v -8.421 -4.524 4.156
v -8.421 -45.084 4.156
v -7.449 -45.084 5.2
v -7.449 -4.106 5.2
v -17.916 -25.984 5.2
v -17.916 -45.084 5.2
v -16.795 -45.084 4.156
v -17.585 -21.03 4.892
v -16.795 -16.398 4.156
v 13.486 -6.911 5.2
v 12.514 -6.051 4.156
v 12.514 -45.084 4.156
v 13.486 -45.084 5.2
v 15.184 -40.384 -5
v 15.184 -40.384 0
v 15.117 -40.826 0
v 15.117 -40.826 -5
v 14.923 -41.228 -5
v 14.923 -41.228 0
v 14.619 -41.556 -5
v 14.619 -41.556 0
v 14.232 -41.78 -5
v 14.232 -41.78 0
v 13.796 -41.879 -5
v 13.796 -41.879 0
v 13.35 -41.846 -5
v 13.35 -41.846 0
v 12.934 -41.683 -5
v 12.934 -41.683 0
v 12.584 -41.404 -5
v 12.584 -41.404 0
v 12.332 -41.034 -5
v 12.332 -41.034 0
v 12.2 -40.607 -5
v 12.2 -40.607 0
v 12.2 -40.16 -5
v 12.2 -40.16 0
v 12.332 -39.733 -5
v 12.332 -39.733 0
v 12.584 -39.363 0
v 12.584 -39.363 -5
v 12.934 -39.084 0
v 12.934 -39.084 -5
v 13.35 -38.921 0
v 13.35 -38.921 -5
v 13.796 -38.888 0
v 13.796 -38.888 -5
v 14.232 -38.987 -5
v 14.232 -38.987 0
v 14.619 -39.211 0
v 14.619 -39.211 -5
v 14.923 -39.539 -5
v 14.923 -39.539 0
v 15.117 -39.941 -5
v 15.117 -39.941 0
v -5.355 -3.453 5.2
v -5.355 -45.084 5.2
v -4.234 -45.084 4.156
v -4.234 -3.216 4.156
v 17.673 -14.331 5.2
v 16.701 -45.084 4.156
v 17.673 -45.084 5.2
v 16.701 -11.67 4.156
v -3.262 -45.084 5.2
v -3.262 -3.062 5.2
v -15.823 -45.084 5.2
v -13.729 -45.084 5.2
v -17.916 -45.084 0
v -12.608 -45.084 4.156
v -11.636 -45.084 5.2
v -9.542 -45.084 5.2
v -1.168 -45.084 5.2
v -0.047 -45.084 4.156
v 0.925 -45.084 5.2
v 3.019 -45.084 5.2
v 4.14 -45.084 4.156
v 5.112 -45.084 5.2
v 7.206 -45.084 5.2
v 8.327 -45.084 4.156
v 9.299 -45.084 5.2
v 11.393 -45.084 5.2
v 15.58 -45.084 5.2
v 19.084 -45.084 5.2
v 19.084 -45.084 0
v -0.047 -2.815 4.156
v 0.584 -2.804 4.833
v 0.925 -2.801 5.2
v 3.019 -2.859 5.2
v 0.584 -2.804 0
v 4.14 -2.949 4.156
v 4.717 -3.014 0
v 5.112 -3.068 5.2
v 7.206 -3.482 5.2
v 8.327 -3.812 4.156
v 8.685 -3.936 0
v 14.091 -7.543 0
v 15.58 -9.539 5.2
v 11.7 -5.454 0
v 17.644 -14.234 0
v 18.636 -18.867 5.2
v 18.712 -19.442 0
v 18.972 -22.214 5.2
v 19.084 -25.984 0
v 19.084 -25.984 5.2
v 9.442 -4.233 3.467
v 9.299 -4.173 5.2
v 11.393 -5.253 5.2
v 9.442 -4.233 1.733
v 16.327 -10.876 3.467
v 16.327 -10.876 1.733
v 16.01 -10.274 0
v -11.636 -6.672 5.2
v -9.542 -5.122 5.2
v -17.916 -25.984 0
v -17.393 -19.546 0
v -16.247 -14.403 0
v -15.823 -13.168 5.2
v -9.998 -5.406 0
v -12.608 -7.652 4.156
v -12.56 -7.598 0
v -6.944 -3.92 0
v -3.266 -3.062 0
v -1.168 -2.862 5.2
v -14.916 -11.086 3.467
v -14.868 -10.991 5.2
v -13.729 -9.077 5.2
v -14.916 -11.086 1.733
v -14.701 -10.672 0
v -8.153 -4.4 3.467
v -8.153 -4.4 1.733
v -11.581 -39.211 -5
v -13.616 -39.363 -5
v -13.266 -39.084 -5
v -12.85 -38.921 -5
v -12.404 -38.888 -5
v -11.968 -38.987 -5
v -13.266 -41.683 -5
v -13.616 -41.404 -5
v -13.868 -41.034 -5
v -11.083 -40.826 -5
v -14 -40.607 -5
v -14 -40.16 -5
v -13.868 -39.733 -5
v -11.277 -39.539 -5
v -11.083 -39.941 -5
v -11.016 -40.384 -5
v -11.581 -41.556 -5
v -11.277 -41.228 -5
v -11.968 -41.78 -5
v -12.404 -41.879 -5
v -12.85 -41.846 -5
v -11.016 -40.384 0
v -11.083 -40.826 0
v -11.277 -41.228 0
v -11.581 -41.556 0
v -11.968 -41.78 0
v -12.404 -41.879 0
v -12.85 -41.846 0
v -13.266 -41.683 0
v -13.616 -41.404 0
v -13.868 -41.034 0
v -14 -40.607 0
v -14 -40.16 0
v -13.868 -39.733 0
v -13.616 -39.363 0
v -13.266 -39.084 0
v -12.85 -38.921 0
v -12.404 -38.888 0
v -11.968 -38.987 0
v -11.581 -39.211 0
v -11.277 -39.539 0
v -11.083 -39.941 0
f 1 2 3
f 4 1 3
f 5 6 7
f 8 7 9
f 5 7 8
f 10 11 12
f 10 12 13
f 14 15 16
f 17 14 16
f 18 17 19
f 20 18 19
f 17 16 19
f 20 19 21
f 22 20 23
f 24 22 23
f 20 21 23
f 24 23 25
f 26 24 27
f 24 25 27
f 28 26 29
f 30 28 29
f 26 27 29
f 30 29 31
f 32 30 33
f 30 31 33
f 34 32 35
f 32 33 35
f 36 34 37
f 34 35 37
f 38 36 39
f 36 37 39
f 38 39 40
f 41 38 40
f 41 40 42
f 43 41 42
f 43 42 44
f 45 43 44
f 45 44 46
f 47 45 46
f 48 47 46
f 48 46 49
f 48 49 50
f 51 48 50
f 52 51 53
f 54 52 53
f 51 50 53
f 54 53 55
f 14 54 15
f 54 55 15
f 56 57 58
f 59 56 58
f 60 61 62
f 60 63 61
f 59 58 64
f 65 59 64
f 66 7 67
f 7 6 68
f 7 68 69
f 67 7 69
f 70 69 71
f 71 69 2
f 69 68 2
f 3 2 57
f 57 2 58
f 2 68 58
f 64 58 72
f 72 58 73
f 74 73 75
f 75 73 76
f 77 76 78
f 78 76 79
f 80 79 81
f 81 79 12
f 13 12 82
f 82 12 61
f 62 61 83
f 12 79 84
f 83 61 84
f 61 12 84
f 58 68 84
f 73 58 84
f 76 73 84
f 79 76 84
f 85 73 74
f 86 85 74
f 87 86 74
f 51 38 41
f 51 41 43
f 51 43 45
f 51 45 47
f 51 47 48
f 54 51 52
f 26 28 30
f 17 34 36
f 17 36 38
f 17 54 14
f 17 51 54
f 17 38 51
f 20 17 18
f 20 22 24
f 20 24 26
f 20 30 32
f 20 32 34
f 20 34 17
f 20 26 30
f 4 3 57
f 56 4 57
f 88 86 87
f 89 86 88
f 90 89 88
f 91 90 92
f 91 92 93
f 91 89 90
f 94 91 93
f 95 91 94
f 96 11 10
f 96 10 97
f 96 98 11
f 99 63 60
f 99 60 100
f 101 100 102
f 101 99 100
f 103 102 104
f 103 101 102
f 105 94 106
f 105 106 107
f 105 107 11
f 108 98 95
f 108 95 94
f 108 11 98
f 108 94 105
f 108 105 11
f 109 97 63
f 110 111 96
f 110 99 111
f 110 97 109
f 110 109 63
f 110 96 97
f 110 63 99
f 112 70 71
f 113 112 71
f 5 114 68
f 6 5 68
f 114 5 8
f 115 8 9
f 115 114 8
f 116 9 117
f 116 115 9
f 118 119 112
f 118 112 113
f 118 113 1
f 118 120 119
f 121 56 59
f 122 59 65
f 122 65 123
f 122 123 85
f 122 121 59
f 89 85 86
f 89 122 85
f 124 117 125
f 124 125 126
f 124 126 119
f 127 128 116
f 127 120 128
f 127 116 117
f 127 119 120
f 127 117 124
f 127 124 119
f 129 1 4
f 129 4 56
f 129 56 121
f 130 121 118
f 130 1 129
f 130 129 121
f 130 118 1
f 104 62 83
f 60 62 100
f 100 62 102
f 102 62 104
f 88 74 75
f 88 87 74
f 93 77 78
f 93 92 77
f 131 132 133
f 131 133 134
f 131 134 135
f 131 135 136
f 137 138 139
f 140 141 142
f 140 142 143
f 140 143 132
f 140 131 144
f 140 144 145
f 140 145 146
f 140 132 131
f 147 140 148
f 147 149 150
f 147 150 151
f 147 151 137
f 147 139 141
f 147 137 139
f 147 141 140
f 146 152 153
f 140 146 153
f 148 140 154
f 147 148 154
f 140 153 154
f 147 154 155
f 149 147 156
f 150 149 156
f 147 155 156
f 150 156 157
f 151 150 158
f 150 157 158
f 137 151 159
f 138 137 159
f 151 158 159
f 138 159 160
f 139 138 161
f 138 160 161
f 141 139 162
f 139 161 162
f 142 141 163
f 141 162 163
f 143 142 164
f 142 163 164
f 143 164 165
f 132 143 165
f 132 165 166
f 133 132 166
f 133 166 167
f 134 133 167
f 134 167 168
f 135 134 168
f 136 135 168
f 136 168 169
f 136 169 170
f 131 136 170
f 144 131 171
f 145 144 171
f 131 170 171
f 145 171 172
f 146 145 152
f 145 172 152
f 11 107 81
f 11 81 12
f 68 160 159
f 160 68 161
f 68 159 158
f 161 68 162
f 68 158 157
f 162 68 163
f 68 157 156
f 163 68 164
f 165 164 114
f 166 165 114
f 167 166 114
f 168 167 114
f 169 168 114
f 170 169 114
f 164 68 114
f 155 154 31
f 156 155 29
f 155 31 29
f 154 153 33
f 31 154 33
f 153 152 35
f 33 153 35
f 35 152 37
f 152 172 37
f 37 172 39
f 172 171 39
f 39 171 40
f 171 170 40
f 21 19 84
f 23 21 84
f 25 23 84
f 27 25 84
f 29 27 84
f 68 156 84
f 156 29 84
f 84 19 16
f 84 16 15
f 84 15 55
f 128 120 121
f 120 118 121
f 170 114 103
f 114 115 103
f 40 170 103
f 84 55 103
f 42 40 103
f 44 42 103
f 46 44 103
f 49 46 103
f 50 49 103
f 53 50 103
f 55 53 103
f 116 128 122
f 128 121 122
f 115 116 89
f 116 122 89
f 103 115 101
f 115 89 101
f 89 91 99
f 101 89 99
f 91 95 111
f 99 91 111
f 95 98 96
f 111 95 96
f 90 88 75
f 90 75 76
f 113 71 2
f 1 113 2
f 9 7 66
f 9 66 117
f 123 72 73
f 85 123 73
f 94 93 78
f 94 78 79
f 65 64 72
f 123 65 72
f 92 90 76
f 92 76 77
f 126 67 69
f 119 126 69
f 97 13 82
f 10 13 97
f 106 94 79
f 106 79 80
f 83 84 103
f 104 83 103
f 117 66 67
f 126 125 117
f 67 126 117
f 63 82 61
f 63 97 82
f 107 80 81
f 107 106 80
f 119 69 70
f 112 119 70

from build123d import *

# Parameters (mm, degrees)
F1_DEPTH = 5.2
F2_R     = 1.5
F3_DEPTH = 5
F5_DEPTH = 47.5


with BuildPart() as f1:
    # F0 (on Top) → F1 (new body)
    with BuildSketch(Plane.XY):
        with BuildLine():
            Line((0.583725, -2.803512), (0.583725, -45.083512))
            Line((0.583725, -45.083512), (19.083725, -45.083512))
            Line((19.083725, -45.083512), (19.083725, -25.983512))
            add(Edge.make_bspline(
                [(0.583725, -2.803512), (9.709766, -2.709429), (19.109245, -5.561374), (19.083725, -25.983512)],
                knots=[29.657417, 29.657417, 29.657417, 29.657417, 59.314835, 59.314835, 59.314835, 59.314835], degree=3))
        make_face()
        with BuildLine():
            Line((-17.916275, -25.983512), (-17.916275, -45.083512))
            Line((-17.916275, -45.083512), (0.583725, -45.083512))
            Line((0.583725, -45.083512), (0.583725, -2.803512))
            add(Edge.make_bspline(
                [(-17.916275, -25.983512), (-17.394919, -5.937705), (-8.542316, -2.897594), (0.583725, -2.803512)],
                knots=[0, 0, 0, 0, 29.657417, 29.657417, 29.657417, 29.657417], degree=3))
        make_face()
    extrude(amount=F1_DEPTH)

    # F2 (on face) → F3 (join)
    with BuildSketch(Plane(origin=(0, 0, 0), x_dir=(1, 0, 0), z_dir=(0, 0, -1))):
        with Locations((-12.516275, 40.383512)):
            Circle(F2_R)
        with Locations((13.683725, 40.383512)):
            Circle(F2_R)
    extrude(amount=F3_DEPTH)

    # F4 (on face) → F5 (cut)
    with BuildSketch(Plane.XZ.offset(45.083512)):
        Polygon((-15.822776, 5.2), (-17.916275, 5.2), (-16.794978, 4.155909), align=None)
        Polygon((-11.635779, 5.2), (-13.729278, 5.2), (-12.607981, 4.155909), align=None)
        Polygon((-7.448782, 5.2), (-9.542281, 5.2), (-8.420984, 4.155909), align=None)
        Polygon((-3.261785, 5.2), (-5.355284, 5.2), (-4.233987, 4.155909), align=None)
        Polygon((0.925212, 5.2), (-1.168287, 5.2), (-0.046989, 4.155909), align=None)
        Polygon((5.112209, 5.2), (3.01871, 5.2), (4.140008, 4.155909), align=None)
        Polygon((8.327005, 4.155909), (9.299206, 5.2), (7.205707, 5.2), align=None)
        Polygon((12.514002, 4.155909), (13.486203, 5.2), (11.392704, 5.2), align=None)
        Polygon((16.700999, 4.155909), (17.6732, 5.2), (15.579701, 5.2), align=None)
    extrude(amount=-F5_DEPTH, mode=Mode.SUBTRACT)


solid = f1.part
